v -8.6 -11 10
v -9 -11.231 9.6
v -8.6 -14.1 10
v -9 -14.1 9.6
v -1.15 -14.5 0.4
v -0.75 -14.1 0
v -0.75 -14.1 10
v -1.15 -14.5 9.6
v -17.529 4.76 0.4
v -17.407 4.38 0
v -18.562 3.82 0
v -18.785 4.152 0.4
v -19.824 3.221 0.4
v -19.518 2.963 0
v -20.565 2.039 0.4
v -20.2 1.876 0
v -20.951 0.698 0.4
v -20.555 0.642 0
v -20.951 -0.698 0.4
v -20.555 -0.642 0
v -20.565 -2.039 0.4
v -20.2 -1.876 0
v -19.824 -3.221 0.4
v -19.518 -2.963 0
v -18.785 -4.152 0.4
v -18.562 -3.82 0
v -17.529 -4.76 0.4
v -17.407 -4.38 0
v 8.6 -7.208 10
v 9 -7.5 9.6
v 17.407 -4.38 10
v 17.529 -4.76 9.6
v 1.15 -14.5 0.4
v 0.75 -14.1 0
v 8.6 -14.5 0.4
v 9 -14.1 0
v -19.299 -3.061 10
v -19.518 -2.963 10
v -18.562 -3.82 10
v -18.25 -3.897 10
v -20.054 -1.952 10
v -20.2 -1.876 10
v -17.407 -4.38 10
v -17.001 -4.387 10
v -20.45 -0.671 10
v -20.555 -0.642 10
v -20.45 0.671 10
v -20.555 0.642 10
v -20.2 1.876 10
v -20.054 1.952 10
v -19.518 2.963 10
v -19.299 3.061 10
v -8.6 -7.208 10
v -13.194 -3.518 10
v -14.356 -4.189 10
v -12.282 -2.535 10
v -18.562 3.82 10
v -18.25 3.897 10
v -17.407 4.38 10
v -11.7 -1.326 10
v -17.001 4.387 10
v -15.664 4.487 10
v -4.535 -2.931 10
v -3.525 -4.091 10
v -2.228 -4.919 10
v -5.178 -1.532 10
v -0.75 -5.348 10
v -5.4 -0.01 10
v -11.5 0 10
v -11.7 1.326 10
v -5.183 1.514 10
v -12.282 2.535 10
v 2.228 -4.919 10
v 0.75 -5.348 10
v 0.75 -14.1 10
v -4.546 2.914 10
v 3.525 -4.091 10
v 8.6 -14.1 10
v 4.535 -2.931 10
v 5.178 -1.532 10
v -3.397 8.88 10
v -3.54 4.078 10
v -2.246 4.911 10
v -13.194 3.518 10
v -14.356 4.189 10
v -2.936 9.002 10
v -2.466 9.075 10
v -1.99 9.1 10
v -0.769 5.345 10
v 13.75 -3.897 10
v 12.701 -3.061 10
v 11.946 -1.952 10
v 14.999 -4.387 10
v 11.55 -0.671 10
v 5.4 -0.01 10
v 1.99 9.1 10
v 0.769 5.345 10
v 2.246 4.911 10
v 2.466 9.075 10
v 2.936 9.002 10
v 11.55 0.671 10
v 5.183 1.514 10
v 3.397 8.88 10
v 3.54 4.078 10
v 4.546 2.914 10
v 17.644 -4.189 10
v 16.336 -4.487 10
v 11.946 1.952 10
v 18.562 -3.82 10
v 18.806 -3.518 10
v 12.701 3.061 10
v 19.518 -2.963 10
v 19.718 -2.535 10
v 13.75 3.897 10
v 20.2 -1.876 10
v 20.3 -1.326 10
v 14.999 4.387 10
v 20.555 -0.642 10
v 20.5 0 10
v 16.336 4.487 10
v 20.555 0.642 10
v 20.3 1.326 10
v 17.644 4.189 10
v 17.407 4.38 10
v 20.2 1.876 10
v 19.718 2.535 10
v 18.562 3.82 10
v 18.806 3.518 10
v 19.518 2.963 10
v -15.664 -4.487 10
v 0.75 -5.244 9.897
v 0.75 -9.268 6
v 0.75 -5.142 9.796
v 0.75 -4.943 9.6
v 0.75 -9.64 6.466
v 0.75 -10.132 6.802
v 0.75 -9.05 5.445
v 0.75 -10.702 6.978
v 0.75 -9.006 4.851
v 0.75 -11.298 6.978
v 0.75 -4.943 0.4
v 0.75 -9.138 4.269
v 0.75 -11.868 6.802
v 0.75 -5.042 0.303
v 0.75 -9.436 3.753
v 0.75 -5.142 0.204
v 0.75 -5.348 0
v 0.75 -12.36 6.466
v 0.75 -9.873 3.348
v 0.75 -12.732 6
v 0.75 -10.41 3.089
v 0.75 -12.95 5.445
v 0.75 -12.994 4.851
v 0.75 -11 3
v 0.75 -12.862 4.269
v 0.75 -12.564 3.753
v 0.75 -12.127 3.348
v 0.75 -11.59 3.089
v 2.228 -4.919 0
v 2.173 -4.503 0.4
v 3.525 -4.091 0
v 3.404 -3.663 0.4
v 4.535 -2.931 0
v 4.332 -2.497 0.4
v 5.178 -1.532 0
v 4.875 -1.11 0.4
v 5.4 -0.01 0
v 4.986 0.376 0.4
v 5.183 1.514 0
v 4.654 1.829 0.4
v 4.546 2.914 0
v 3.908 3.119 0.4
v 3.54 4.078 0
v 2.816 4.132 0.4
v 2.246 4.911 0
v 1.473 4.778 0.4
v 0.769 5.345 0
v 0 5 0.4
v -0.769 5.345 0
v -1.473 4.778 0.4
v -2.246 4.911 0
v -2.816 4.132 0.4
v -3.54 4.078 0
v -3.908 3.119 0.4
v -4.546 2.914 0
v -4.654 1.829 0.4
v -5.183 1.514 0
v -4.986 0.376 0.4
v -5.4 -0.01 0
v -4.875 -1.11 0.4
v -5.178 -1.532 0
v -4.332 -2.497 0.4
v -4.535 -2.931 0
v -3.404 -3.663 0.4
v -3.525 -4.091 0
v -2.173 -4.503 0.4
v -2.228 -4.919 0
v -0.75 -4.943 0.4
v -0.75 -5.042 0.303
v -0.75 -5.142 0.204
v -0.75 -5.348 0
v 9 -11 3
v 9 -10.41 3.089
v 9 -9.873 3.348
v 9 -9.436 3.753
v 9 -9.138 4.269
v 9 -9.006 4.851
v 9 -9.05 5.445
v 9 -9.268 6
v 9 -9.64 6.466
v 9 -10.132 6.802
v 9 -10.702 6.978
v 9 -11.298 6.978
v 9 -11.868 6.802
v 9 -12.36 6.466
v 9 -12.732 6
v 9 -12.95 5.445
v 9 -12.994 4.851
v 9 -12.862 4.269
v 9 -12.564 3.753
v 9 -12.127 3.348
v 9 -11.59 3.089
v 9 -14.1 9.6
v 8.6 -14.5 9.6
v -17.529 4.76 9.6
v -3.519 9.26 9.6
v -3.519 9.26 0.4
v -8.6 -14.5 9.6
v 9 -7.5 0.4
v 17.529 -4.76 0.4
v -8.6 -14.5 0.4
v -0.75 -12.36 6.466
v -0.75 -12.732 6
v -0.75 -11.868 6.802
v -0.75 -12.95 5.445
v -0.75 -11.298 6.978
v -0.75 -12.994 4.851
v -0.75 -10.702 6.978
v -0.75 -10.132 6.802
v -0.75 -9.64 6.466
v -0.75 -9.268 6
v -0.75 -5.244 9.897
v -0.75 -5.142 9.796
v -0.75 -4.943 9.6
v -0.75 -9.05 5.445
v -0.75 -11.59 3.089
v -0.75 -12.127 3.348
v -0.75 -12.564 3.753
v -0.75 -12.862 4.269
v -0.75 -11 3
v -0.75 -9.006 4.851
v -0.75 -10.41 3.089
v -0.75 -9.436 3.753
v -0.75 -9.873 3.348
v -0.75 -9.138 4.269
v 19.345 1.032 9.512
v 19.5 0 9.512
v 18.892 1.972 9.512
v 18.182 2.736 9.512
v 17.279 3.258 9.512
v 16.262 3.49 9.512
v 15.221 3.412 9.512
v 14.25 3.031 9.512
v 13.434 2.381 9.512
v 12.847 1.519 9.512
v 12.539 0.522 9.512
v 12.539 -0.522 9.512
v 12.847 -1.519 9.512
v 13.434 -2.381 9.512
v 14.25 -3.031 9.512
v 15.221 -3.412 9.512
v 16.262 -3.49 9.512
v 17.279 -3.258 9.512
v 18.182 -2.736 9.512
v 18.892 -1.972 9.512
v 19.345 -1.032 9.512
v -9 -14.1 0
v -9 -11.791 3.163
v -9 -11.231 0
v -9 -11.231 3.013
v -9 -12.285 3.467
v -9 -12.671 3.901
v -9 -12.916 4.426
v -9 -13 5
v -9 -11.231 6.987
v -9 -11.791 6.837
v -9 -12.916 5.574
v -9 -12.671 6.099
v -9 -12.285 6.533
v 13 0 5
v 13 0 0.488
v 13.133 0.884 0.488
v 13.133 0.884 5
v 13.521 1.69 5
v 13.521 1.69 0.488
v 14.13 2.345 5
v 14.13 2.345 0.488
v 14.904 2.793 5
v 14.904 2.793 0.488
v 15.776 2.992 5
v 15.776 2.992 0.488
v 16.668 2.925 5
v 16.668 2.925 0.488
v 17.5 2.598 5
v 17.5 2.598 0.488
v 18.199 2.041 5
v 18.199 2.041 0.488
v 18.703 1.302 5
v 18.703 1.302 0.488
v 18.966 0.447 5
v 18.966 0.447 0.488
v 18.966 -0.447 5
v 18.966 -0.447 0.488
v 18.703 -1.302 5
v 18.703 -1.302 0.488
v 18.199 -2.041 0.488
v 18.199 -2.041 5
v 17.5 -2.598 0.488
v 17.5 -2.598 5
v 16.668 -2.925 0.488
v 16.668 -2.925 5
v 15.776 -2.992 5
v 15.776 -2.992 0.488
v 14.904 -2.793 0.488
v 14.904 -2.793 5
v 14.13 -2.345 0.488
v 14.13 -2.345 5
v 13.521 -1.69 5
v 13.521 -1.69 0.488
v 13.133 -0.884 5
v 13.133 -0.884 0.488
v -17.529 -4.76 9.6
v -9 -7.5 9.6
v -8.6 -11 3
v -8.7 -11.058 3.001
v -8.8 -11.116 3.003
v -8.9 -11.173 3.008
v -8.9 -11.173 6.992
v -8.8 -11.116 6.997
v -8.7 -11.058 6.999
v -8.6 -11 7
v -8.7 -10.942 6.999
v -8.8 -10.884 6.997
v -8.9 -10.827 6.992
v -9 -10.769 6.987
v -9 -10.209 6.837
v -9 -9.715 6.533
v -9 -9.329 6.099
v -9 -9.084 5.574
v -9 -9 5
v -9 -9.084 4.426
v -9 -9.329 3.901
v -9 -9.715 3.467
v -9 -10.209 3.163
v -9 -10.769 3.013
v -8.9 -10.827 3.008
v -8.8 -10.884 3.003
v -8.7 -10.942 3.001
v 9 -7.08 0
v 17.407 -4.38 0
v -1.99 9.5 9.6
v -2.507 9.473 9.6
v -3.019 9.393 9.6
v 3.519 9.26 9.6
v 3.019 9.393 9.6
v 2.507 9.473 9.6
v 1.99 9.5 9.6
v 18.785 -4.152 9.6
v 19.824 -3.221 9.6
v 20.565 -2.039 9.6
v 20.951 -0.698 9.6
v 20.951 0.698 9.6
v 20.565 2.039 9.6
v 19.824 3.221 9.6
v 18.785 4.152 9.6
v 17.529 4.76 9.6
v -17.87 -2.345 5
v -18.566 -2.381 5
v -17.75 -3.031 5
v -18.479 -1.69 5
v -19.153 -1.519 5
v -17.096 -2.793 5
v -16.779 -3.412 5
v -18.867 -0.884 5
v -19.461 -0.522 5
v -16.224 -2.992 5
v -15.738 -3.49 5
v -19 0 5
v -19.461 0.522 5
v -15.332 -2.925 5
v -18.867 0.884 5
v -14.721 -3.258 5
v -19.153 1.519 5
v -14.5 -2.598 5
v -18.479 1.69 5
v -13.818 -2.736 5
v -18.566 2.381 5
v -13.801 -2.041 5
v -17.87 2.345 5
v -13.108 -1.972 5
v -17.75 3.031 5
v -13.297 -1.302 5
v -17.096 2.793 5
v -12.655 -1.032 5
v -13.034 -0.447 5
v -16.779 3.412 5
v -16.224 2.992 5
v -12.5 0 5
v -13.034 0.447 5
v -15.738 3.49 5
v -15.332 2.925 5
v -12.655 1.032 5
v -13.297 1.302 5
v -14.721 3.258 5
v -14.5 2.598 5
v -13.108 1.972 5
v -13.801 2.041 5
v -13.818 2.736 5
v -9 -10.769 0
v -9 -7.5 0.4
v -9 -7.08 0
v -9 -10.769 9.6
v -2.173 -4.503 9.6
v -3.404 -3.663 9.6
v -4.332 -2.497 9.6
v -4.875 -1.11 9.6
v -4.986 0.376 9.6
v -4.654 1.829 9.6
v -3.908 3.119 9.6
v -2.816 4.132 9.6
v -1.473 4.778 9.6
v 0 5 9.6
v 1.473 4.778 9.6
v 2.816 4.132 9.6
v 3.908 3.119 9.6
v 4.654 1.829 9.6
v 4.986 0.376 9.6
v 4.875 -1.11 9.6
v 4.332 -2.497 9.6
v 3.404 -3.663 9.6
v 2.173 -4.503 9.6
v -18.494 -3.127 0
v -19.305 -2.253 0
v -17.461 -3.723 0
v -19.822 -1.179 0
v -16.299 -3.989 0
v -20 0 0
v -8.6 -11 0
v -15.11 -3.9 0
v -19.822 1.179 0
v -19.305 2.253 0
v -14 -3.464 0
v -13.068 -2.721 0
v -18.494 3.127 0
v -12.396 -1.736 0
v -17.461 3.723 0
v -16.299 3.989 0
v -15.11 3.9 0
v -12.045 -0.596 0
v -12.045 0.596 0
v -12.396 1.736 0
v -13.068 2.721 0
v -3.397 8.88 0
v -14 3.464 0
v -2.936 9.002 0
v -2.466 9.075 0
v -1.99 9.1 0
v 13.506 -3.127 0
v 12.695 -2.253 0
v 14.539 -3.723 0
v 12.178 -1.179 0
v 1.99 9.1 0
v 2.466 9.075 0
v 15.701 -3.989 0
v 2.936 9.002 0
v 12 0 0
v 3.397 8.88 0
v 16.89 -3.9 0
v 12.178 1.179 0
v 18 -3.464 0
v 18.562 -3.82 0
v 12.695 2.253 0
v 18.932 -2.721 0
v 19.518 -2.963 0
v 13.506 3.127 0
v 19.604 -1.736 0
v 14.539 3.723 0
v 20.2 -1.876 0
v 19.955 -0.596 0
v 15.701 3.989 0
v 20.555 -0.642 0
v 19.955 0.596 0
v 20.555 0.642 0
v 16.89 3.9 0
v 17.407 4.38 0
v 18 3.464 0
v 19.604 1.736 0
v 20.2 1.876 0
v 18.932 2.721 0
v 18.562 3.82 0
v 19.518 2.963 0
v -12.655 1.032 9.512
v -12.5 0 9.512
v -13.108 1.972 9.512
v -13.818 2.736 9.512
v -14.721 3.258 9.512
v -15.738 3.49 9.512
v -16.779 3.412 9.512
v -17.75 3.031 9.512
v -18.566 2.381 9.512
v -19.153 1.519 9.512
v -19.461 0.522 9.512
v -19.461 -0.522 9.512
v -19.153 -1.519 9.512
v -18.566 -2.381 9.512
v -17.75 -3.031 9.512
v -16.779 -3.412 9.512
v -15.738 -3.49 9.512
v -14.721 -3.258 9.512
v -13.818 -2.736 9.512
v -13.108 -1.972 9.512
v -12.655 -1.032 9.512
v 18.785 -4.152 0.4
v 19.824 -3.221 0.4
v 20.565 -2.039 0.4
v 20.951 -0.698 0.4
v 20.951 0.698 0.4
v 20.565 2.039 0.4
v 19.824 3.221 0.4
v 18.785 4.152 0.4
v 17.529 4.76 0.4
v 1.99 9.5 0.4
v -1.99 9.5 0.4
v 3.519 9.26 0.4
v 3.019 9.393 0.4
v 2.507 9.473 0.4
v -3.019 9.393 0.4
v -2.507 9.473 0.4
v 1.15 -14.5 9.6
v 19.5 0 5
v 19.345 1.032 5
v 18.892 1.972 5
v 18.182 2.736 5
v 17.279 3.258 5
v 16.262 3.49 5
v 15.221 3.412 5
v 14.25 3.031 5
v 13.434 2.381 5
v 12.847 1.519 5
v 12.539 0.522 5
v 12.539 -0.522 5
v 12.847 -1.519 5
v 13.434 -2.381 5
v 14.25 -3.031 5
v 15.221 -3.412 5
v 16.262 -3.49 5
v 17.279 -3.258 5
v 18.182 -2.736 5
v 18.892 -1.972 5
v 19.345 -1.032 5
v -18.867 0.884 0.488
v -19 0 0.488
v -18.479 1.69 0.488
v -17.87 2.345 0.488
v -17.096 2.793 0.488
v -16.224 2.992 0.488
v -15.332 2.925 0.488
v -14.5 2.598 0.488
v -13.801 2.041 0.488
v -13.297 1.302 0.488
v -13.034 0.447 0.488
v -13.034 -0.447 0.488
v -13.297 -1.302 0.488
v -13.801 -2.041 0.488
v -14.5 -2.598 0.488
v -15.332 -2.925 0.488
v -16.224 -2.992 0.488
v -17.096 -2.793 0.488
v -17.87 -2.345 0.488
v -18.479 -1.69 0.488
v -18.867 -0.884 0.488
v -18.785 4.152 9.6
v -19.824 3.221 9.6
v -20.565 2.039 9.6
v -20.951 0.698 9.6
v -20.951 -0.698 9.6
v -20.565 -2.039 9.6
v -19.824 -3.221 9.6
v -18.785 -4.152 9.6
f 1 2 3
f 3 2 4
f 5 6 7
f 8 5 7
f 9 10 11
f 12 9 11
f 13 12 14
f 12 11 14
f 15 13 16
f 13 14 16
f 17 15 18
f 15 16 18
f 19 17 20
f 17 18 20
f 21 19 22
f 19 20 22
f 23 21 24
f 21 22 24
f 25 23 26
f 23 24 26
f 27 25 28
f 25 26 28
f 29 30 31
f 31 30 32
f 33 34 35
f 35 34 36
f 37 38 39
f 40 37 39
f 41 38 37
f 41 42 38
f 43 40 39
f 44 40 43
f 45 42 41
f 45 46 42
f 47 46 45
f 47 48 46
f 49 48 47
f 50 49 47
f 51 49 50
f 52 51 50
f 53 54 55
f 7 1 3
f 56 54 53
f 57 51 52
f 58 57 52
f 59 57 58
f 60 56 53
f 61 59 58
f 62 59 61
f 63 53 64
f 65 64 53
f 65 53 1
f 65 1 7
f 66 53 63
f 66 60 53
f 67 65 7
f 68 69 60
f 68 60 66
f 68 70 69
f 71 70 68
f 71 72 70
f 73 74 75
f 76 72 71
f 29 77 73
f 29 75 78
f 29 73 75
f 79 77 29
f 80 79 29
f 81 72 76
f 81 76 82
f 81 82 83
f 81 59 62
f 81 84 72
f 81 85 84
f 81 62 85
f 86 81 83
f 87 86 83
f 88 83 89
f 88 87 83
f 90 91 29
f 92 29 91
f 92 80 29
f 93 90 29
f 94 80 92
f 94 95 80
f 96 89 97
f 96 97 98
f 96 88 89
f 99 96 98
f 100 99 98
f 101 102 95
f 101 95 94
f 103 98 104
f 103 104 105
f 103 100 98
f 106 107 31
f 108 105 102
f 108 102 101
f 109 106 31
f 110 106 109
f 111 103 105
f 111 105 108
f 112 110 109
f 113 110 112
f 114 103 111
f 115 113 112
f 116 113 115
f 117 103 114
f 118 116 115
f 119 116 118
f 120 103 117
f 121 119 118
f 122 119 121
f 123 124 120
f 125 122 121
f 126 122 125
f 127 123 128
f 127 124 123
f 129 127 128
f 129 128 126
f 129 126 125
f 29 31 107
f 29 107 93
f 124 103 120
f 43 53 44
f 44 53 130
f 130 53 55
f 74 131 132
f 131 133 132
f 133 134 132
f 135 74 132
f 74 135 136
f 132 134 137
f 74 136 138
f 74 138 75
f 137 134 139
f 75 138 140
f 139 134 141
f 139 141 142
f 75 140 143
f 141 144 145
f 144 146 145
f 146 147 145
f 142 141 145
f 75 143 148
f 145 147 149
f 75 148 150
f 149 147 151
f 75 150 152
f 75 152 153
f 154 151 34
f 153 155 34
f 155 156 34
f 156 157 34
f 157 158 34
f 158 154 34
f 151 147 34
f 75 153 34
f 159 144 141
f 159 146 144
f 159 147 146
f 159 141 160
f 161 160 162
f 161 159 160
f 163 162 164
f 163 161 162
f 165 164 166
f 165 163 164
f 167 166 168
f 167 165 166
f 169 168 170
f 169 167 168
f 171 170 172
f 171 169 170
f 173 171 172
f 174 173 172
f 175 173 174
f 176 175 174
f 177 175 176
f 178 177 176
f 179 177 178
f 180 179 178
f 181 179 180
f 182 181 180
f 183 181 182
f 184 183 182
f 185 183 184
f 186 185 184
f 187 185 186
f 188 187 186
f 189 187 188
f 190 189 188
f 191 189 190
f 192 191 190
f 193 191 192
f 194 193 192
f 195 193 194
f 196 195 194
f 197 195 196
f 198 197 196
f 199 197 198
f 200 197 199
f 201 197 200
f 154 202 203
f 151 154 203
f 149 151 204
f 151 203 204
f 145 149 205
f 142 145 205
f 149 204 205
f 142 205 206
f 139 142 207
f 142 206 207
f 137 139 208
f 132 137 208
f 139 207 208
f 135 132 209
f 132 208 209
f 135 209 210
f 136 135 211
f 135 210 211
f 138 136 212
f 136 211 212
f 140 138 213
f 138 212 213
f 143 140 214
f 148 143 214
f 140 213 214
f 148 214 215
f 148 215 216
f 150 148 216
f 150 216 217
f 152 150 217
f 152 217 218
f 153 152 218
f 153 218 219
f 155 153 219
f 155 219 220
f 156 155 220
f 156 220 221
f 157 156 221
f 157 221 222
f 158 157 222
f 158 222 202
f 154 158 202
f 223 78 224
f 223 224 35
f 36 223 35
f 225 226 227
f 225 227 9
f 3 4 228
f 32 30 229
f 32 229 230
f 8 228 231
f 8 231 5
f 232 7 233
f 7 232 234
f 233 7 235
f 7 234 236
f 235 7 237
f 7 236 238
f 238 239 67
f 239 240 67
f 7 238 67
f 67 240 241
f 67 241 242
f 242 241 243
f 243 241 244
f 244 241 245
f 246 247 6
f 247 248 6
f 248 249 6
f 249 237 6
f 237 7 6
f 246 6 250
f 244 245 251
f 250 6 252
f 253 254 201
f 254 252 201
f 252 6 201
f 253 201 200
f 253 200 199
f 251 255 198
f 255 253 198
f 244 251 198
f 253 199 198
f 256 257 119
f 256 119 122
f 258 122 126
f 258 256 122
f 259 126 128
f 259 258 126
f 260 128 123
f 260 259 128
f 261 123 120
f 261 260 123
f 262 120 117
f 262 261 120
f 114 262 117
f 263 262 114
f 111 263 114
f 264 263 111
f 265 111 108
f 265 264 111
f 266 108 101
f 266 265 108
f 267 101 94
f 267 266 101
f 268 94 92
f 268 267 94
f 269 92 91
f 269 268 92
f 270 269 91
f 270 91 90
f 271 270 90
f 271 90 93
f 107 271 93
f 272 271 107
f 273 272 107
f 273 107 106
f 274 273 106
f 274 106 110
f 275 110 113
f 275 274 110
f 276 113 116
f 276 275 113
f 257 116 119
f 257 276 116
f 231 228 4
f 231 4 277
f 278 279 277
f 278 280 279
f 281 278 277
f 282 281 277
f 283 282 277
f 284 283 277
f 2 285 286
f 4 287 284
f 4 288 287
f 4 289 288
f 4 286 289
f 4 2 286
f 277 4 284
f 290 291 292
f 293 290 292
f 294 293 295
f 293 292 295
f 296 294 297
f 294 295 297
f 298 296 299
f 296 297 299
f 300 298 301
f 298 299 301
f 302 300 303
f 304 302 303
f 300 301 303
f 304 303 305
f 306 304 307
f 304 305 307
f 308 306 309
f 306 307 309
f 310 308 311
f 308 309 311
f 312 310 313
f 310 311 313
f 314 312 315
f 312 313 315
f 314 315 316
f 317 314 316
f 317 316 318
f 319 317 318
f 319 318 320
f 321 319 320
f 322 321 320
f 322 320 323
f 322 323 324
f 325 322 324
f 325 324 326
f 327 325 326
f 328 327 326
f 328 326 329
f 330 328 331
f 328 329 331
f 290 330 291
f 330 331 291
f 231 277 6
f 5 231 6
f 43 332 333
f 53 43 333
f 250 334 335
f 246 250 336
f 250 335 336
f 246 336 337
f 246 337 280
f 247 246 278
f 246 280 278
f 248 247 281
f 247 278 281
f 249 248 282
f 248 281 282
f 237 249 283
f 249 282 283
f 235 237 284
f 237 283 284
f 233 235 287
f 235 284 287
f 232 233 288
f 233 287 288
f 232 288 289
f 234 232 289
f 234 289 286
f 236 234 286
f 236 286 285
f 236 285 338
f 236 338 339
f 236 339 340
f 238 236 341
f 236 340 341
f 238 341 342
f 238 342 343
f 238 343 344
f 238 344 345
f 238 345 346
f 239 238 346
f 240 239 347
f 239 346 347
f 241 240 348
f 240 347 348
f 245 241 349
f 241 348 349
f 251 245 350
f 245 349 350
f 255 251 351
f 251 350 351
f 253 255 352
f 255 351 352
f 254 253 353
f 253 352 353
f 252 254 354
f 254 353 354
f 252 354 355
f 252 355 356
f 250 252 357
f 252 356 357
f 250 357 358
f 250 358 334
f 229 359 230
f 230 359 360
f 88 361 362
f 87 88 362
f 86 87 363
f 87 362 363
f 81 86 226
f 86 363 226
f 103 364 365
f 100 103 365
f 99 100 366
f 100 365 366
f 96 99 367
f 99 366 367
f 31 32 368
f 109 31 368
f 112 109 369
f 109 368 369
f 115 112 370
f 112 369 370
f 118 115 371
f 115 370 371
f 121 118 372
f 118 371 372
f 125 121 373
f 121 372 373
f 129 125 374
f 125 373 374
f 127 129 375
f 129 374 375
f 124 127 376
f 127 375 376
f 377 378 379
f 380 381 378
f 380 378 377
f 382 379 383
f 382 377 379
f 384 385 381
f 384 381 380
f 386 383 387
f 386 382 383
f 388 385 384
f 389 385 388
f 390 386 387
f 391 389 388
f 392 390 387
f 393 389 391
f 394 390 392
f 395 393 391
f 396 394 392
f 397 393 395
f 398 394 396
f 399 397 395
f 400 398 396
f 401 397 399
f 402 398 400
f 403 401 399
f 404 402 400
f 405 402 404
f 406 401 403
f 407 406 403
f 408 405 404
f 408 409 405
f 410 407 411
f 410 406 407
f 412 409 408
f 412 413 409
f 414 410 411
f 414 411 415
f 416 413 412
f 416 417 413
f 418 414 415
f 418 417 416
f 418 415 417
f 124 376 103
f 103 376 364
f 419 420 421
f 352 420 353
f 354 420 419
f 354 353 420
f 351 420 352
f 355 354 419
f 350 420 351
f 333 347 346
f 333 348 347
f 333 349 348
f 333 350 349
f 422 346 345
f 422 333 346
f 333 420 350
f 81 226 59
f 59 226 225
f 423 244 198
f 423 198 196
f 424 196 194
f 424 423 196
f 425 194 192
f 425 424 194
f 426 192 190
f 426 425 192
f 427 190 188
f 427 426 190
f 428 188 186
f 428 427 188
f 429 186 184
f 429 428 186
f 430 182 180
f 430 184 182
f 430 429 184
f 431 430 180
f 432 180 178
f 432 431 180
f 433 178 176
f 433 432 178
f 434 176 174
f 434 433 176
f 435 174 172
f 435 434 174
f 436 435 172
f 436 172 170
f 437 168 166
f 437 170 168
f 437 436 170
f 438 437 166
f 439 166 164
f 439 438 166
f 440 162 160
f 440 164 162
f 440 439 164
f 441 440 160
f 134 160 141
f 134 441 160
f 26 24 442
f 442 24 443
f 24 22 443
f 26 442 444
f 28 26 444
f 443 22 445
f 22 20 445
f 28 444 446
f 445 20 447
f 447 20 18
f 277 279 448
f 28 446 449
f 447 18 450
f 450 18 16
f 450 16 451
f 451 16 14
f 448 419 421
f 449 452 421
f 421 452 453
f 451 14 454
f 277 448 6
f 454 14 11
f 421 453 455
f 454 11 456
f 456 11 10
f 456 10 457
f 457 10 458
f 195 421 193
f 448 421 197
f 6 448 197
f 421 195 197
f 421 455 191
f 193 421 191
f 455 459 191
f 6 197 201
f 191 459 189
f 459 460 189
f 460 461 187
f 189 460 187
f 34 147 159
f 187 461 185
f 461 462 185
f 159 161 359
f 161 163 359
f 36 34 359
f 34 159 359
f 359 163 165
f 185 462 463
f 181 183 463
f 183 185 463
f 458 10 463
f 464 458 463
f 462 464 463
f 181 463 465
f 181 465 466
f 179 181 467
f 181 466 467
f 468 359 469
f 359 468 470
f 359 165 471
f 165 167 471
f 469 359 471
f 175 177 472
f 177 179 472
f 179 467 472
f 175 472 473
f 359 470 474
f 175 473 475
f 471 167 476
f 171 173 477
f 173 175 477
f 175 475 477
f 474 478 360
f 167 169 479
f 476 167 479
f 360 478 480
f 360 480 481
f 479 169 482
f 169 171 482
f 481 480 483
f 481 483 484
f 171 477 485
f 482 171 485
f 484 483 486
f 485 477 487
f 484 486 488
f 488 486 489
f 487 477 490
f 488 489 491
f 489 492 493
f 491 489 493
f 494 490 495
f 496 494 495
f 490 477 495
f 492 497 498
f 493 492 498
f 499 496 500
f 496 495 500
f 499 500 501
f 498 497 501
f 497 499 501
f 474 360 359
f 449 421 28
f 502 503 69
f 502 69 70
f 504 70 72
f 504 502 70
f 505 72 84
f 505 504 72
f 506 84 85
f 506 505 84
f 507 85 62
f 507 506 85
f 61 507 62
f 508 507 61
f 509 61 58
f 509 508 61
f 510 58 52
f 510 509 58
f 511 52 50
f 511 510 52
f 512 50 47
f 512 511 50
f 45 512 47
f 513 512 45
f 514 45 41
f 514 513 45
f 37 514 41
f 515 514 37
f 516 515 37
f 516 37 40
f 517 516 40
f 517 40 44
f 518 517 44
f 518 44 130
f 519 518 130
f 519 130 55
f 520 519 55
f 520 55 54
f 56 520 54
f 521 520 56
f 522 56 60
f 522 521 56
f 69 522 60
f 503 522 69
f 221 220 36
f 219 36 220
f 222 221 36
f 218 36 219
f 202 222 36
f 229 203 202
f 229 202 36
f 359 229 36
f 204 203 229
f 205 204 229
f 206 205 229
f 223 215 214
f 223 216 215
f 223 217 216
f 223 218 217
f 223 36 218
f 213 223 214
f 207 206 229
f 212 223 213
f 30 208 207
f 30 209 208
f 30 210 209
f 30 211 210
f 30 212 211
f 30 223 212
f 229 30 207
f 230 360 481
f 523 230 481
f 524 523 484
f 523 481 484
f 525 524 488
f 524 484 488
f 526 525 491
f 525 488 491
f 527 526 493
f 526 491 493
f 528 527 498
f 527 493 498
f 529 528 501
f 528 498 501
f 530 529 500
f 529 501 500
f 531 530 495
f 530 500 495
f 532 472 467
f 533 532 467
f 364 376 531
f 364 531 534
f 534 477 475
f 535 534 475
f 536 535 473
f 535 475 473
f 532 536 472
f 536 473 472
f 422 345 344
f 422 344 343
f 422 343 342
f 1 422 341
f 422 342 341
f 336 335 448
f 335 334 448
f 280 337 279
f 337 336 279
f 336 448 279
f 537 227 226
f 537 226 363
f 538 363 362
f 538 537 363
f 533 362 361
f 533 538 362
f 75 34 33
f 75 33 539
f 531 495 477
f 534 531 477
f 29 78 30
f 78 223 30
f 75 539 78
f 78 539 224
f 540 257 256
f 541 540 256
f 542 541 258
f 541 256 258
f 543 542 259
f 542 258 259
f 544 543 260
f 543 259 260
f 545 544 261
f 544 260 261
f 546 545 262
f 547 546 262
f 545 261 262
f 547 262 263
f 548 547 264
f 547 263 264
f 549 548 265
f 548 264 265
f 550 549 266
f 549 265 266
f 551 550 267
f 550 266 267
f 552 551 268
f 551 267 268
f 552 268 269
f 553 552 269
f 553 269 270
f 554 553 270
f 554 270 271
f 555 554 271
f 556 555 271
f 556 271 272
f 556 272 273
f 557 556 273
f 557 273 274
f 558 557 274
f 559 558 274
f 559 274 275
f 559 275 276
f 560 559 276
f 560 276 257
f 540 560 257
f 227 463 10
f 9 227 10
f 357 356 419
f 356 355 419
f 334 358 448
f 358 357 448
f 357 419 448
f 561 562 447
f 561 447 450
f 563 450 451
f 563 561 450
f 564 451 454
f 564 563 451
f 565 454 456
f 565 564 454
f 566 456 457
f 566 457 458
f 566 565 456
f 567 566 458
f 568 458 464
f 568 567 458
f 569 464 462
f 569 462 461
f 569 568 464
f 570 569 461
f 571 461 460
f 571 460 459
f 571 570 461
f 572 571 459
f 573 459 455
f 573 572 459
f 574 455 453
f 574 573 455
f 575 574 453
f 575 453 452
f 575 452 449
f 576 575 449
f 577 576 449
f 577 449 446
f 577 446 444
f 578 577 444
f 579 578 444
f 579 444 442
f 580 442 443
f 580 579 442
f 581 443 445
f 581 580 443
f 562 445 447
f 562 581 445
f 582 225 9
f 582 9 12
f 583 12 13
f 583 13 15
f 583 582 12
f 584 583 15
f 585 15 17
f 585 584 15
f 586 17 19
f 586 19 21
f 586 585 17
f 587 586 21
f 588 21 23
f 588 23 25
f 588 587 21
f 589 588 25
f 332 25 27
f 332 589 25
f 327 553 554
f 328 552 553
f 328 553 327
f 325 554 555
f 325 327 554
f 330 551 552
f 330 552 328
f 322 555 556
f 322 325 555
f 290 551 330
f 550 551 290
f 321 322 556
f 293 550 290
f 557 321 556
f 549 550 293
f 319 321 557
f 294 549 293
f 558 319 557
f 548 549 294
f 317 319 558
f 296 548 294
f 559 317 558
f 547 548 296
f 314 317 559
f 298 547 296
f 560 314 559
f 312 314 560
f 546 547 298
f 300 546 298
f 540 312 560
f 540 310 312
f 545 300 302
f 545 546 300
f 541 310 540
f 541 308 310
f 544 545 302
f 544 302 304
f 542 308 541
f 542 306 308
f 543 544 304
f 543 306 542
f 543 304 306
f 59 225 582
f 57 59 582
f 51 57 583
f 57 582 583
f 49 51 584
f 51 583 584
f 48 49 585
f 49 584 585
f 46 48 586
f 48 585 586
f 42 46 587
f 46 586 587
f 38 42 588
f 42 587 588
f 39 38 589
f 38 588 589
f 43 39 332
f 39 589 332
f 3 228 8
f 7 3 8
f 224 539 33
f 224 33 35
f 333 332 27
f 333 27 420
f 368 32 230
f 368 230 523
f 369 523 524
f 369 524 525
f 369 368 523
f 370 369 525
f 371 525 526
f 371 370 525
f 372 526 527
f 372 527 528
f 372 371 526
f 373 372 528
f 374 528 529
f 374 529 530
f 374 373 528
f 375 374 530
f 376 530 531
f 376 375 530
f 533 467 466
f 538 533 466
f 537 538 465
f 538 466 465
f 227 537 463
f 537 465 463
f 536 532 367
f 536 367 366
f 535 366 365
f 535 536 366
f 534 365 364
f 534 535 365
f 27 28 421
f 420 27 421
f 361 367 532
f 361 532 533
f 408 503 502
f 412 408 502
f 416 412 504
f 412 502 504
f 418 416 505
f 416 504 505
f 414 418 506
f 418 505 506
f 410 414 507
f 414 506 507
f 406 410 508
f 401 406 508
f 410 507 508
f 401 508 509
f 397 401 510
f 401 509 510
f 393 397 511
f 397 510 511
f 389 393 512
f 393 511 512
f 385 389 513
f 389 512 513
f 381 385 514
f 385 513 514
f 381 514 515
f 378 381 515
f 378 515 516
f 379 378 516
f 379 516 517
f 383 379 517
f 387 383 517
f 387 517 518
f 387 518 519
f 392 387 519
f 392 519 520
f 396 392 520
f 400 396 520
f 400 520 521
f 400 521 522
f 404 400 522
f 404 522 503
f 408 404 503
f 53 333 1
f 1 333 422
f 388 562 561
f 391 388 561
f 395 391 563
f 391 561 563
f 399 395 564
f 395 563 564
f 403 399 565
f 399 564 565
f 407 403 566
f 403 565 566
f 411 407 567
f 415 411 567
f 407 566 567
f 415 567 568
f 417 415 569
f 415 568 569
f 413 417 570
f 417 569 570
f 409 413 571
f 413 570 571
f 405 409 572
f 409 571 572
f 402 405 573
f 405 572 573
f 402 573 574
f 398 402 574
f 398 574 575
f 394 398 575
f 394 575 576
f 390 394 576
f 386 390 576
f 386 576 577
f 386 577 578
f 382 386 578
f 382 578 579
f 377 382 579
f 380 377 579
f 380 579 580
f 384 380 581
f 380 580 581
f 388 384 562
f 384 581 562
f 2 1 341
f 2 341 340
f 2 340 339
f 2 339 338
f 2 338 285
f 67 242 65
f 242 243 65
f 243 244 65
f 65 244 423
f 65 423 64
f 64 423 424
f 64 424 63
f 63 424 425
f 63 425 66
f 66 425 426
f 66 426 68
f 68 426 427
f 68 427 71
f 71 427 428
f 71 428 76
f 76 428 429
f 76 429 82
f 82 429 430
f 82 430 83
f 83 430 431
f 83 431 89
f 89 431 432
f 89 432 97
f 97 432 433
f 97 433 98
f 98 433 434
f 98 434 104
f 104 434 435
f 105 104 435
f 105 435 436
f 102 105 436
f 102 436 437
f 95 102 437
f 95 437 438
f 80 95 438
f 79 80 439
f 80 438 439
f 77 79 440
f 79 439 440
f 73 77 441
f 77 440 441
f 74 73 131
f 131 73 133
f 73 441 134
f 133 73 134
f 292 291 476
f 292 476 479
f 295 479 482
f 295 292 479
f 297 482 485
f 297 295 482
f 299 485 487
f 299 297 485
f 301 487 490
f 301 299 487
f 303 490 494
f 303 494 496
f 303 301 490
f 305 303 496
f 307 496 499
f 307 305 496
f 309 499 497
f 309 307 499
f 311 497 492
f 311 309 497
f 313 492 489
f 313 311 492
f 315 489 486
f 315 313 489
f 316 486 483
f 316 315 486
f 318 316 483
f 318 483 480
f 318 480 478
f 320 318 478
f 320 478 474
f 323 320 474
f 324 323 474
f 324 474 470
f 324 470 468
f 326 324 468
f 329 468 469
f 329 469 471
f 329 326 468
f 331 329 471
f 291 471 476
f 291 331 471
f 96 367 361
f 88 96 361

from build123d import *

# Parameters (mm, degrees)
BOSS_EXTRUDE1_DEPTH             = 10
CUT_EXTRUDE1_DEPTH              = 28.408940147
CUT_EXTRUDE2_DEPTH              = 28.408940147
DRAFT1_ANGLE                    = 30
SKETCH4_W                       = 5
SKETCH4_H                       = 10
SKETCH5_W                       = 2
SKETCH5_H                       = 20.25
F_4_0_4_DIAMETER_HOLE2_D        = 4
F_4_0_4_DIAMETER_HOLE2_DEPTH    = 20.25
M7X1_0_TAPPED_HOLE1_D           = 6
M7X1_0_TAPPED_HOLE1_CBORE_D     = 7
M7X1_0_TAPPED_HOLE1_CBORE_DEPTH = 5
FILLET1_R                       = 5
CHAMFER1_SIZE                   = 1
CHAMFER1_SIZE2                  = 0.487732589
CHAMFER2_SIZE                   = 0.4
CHAMFER3_SIZE                   = 1
CHAMFER3_SIZE2                  = 0.487732589


with BuildPart() as part:
    # Sketch1 → Boss-Extrude1 (new body)
    with BuildSketch(Plane.XY.offset(10)):
        with BuildLine():
            Line((-9, -7.5), (-9, -14.5))
            Line((-9, -14.5), (9, -14.5))
            Line((9, -14.5), (9, -7.5))
            Line((9, -7.5), (17.529062862, -4.760458672))
            ThreePointArc((17.529062862, -4.760458672), (21, 0), (17.529062862, 4.760458672))
            Line((17.529062862, 4.760458672), (2.773364341, 9.5))
            Line((2.773364341, 9.5), (-2.773364341, 9.5))
            Line((-2.773364341, 9.5), (-17.529062862, 4.760458672))
            ThreePointArc((-17.529062862, 4.760458672), (-21, 0), (-17.529062862, -4.760458672))
            Line((-17.529062862, -4.760458672), (-9, -7.5))
        make_face()
    extrude(amount=-BOSS_EXTRUDE1_DEPTH)

    # Sketch2 → Cut-Extrude1 (cut, through all)
    with BuildSketch(Plane(origin=(0, 0, 0), x_dir=(-1, 0, 0), z_dir=(0, 0, -1))):
        Polygon((9, -11.230940108), (9, -10.769059892), (8.2, -10.769059892), align=None)
    extrude(amount=-CUT_EXTRUDE1_DEPTH, mode=Mode.SUBTRACT)

    # Sketch3 → Cut-Extrude2 (cut, through all)
    with BuildSketch(Plane(origin=(0, 0, 0), x_dir=(-1, 0, 0), z_dir=(0, 0, -1))):
        with BuildLine():
            Line((0.75, -14.5), (0.75, -4.943429983))
            ThreePointArc((0.75, -4.943429983), (0, -5), (-0.75, -4.943429983))
            Line((-0.75, -4.943429983), (-0.75, -14.5))
            Line((-0.75, -14.5), (0.75, -14.5))
        make_face()
    extrude(amount=-CUT_EXTRUDE2_DEPTH, mode=Mode.SUBTRACT)

    # Draft1
    draft1_faces = [part.faces().sort_by_distance(p)[0] for p in [
        (-8.6, -10.769059892, 5),
    ]]
    draft(draft1_faces, Plane(origin=(-9, -7.5, 0), x_dir=(0, 0, -1), z_dir=(-1, 0, 0)), DRAFT1_ANGLE)

    # Sketch4 → Cut-Revolve1 (revolve, cut)
    with BuildSketch(Plane.XZ):
        with Locations((2.5, 5)):
            Rectangle(SKETCH4_W, SKETCH4_H)
    revolve(axis=Axis((0, 0, 10), (0, 0, -1)), mode=Mode.SUBTRACT)

    # Sketch5 → Ø4.0 (4) Diameter Hole1 (revolve, cut)
    with BuildSketch(Plane(origin=(-0.75, -11, 5), x_dir=(0, 0, -1), z_dir=(0, 1, 0))):
        with Locations((1, 10.125)):
            Rectangle(SKETCH5_W, SKETCH5_H)
    revolve(axis=Axis((5.6, -11, 5), (-1, 0, 0)), mode=Mode.SUBTRACT)

    # Ø4.0 (4) Diameter Hole2
    with Locations(Plane.ZY.offset(-0.75)):
        with Locations((5, -11)):
            Hole(F_4_0_4_DIAMETER_HOLE2_D / 2, depth=F_4_0_4_DIAMETER_HOLE2_DEPTH)

    # M7x1.0 Tapped Hole1 (through all)
    with Locations(Plane.XY.offset(10)):
        with Locations((-16, 0), (16, 0)):
            CounterBoreHole(M7X1_0_TAPPED_HOLE1_D / 2, M7X1_0_TAPPED_HOLE1_CBORE_D / 2, M7X1_0_TAPPED_HOLE1_CBORE_DEPTH)

    # Fillet1
    fillet1_edges = [part.edges().sort_by_distance(p)[0] for p in [
        (-2.773364341, 9.5, 5),
        (2.773364341, 9.5, 5),
    ]]
    fillet(fillet1_edges, radius=FILLET1_R)

    # Chamfer1
    chamfer1_edges = [part.edges().sort_by_distance(p)[0] for p in [
        (12.5, 0, 10),
        (-19.5, 0, 10),
    ]]
    chamfer1_side = [part.faces().sort_by_distance(p)[0] for p in [
        (0, 9.016264535, 10),
    ]]
    chamfer(chamfer1_edges, length=CHAMFER1_SIZE, length2=CHAMFER1_SIZE2, reference=chamfer1_side[0])

    # Chamfer2
    chamfer2_edges = [part.edges().sort_by_distance(p)[0] for p in [
        (13.264531431, -6.130229336, 0),
        (21, 0, 0),
        (10.524097746, 7.010458672, 0),
        (2.763925905, 9.439751682, 0),
        (0, 9.5, 0),
        (-2.763925905, 9.439751682, 0),
        (-10.524097746, 7.010458672, 0),
        (-13.264531431, -6.130229336, 0),
        (-21, 0, 0),
        (-9, -9.134529946, 10),
        (-13.264531431, -6.130229336, 10),
        (-21, 0, 10),
        (-10.524097746, 7.010458672, 10),
        (-2.763925905, 9.439751682, 10),
        (0, 9.5, 10),
        (2.763925905, 9.439751682, 10),
        (10.524097746, 7.010458672, 10),
        (21, 0, 10),
        (13.264531431, -6.130229336, 10),
        (9, -11, 10),
        (4.875, -14.5, 10),
        (9, -14.5, 5),
        (0.75, -14.5, 5),
        (4.875, -14.5, 0),
        (0, 5, 10),
        (-9, -12.865470054, 10),
        (-9, -14.5, 5),
        (-4.875, -14.5, 0),
        (-0.75, -14.5, 5),
        (-4.875, -14.5, 10),
        (0, 5, 0),
    ]]
    chamfer(chamfer2_edges, length=CHAMFER2_SIZE - 0.0001)  # a hair under: the kernel refuses the full size

    # Chamfer3
    chamfer3_edges = [part.edges().sort_by_distance(p)[0] for p in [
        (19, 0, 0),
        (-13, 0, 0),
    ]]
    chamfer3_side = [part.faces().sort_by_distance(p)[0] for p in [
        (4.875, -13.627267497, 0),
    ]]
    chamfer(chamfer3_edges, length=CHAMFER3_SIZE, length2=CHAMFER3_SIZE2, reference=chamfer3_side[0])


solid = part.part
